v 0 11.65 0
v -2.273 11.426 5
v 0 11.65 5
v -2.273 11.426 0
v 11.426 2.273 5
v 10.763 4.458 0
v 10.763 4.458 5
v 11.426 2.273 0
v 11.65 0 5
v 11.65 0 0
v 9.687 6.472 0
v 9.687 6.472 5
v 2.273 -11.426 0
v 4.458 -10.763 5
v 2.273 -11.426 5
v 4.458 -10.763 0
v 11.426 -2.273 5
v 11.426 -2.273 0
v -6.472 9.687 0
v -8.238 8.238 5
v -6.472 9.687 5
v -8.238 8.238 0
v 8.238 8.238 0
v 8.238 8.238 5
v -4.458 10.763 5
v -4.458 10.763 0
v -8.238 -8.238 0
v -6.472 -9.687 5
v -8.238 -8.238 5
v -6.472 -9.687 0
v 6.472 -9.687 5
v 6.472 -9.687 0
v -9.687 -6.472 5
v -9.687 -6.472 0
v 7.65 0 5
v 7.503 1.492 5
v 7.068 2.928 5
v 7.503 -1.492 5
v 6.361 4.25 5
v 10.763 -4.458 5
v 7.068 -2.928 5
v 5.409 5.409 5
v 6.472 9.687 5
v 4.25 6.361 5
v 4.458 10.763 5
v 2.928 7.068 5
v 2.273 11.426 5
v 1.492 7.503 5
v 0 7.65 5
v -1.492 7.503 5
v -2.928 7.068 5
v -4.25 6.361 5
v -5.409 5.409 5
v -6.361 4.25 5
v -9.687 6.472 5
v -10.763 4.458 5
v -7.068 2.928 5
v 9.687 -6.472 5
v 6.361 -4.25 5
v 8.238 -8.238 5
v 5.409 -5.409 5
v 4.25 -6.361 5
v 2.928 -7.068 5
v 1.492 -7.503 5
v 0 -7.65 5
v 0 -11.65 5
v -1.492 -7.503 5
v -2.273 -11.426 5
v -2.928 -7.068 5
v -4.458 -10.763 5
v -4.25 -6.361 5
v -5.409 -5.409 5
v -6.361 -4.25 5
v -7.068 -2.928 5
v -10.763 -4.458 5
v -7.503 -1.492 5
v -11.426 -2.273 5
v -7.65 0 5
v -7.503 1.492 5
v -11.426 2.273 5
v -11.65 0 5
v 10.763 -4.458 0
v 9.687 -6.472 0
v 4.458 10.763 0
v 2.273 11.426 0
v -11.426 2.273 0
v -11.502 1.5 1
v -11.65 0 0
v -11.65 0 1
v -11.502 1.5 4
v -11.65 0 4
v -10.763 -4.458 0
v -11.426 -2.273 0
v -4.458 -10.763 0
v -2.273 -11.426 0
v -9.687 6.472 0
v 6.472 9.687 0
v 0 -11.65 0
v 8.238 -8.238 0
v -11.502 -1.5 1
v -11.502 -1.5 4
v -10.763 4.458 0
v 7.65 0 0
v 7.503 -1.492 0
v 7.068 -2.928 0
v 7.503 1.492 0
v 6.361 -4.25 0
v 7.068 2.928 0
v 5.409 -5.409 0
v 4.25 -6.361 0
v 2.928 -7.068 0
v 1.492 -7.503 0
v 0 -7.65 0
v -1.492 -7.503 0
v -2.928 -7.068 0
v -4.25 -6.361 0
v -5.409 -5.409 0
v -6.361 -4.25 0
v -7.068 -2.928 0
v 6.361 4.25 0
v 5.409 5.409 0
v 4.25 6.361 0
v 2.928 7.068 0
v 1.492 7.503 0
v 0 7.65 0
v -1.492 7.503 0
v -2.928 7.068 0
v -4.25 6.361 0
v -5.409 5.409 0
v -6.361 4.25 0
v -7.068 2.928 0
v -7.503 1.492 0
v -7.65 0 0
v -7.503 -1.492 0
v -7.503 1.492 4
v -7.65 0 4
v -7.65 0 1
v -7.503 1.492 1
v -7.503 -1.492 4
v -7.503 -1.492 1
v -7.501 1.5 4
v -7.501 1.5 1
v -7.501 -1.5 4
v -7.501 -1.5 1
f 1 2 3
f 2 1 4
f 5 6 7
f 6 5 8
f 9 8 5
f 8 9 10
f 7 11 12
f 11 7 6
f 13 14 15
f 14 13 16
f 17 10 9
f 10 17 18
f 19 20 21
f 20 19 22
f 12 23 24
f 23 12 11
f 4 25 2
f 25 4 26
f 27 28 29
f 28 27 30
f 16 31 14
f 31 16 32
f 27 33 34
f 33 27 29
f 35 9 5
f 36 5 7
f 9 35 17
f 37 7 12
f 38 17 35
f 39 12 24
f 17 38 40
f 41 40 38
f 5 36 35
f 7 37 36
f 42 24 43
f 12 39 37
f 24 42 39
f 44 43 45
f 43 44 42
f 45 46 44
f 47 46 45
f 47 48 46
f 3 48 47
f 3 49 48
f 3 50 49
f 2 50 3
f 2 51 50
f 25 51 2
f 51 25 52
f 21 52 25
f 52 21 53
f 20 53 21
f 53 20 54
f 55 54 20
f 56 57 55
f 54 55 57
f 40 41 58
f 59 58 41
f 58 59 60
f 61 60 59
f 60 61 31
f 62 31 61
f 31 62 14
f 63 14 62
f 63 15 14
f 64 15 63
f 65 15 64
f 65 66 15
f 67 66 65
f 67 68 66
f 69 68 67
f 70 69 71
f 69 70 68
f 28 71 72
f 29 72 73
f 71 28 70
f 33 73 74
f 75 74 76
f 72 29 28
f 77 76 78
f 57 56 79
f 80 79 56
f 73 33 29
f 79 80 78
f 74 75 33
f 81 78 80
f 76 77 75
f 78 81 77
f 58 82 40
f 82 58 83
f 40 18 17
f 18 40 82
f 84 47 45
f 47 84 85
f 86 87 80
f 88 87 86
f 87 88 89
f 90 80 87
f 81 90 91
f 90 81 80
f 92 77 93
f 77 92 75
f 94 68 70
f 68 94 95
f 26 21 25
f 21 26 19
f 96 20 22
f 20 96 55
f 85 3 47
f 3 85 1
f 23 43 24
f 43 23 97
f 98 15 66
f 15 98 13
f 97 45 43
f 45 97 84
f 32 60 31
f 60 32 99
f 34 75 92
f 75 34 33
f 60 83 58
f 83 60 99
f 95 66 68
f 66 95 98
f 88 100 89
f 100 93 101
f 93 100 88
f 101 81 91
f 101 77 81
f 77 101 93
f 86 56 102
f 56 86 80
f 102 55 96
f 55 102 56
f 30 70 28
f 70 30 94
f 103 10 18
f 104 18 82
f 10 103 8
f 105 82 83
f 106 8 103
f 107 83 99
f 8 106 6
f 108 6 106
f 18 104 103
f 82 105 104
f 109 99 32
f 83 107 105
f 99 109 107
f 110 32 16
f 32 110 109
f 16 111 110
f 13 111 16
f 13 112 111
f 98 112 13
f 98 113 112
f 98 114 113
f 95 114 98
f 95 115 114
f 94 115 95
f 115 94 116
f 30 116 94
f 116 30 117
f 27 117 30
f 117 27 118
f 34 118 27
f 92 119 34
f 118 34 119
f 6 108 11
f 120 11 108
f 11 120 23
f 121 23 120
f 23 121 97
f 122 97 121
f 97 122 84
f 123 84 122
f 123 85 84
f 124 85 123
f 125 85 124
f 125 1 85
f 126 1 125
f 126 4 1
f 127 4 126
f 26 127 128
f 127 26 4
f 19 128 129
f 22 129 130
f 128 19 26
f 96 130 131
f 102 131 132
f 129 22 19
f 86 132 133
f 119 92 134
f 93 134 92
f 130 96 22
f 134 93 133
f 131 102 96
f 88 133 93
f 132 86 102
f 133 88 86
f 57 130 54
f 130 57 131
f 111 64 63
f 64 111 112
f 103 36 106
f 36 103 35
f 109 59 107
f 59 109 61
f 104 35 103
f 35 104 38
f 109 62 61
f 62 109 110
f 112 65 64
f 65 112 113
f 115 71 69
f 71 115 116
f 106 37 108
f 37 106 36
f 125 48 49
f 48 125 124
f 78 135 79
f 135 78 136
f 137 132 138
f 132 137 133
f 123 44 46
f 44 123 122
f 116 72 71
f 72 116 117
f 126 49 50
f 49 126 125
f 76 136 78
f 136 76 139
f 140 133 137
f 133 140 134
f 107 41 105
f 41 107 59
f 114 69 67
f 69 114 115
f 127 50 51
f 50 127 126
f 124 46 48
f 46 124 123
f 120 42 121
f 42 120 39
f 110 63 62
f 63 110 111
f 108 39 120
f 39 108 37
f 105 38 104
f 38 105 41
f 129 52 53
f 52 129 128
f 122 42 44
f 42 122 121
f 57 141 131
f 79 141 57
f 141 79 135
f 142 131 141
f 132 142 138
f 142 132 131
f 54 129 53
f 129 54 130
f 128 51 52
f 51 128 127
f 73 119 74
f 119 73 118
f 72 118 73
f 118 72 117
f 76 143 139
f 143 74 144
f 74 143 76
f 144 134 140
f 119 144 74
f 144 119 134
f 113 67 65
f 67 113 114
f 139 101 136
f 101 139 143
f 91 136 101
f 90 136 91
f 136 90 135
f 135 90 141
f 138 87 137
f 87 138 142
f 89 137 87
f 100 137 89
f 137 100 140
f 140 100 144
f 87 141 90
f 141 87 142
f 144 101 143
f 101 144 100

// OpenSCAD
$fn = 32;

// ----------------------------------------------------------------------
// Spacer sleeve: 23.3 / 15.3 x 5 mm
// ----------------------------------------------------------------------

// --- parameters (mm) ---
tube_d = 23.3;            // outside diameter
bore_d = 15.3;            // shaft bore
tube_l = 5;               // sleeve length
slot_w = 3;               // clamp slot width
slot_len = 3;             // clamp slot length

module sleeve() {
  cylinder(h = tube_l, d = tube_d);
}

difference() {
  sleeve();
  translate([0, 0, -1]) cylinder(h = tube_l + 2, d = bore_d);
  translate([-tube_d / 2 - 1, -slot_w / 2, tube_l / 2 - slot_len / 2]) cube([tube_d / 2 + 1, slot_w, slot_len]);
}
